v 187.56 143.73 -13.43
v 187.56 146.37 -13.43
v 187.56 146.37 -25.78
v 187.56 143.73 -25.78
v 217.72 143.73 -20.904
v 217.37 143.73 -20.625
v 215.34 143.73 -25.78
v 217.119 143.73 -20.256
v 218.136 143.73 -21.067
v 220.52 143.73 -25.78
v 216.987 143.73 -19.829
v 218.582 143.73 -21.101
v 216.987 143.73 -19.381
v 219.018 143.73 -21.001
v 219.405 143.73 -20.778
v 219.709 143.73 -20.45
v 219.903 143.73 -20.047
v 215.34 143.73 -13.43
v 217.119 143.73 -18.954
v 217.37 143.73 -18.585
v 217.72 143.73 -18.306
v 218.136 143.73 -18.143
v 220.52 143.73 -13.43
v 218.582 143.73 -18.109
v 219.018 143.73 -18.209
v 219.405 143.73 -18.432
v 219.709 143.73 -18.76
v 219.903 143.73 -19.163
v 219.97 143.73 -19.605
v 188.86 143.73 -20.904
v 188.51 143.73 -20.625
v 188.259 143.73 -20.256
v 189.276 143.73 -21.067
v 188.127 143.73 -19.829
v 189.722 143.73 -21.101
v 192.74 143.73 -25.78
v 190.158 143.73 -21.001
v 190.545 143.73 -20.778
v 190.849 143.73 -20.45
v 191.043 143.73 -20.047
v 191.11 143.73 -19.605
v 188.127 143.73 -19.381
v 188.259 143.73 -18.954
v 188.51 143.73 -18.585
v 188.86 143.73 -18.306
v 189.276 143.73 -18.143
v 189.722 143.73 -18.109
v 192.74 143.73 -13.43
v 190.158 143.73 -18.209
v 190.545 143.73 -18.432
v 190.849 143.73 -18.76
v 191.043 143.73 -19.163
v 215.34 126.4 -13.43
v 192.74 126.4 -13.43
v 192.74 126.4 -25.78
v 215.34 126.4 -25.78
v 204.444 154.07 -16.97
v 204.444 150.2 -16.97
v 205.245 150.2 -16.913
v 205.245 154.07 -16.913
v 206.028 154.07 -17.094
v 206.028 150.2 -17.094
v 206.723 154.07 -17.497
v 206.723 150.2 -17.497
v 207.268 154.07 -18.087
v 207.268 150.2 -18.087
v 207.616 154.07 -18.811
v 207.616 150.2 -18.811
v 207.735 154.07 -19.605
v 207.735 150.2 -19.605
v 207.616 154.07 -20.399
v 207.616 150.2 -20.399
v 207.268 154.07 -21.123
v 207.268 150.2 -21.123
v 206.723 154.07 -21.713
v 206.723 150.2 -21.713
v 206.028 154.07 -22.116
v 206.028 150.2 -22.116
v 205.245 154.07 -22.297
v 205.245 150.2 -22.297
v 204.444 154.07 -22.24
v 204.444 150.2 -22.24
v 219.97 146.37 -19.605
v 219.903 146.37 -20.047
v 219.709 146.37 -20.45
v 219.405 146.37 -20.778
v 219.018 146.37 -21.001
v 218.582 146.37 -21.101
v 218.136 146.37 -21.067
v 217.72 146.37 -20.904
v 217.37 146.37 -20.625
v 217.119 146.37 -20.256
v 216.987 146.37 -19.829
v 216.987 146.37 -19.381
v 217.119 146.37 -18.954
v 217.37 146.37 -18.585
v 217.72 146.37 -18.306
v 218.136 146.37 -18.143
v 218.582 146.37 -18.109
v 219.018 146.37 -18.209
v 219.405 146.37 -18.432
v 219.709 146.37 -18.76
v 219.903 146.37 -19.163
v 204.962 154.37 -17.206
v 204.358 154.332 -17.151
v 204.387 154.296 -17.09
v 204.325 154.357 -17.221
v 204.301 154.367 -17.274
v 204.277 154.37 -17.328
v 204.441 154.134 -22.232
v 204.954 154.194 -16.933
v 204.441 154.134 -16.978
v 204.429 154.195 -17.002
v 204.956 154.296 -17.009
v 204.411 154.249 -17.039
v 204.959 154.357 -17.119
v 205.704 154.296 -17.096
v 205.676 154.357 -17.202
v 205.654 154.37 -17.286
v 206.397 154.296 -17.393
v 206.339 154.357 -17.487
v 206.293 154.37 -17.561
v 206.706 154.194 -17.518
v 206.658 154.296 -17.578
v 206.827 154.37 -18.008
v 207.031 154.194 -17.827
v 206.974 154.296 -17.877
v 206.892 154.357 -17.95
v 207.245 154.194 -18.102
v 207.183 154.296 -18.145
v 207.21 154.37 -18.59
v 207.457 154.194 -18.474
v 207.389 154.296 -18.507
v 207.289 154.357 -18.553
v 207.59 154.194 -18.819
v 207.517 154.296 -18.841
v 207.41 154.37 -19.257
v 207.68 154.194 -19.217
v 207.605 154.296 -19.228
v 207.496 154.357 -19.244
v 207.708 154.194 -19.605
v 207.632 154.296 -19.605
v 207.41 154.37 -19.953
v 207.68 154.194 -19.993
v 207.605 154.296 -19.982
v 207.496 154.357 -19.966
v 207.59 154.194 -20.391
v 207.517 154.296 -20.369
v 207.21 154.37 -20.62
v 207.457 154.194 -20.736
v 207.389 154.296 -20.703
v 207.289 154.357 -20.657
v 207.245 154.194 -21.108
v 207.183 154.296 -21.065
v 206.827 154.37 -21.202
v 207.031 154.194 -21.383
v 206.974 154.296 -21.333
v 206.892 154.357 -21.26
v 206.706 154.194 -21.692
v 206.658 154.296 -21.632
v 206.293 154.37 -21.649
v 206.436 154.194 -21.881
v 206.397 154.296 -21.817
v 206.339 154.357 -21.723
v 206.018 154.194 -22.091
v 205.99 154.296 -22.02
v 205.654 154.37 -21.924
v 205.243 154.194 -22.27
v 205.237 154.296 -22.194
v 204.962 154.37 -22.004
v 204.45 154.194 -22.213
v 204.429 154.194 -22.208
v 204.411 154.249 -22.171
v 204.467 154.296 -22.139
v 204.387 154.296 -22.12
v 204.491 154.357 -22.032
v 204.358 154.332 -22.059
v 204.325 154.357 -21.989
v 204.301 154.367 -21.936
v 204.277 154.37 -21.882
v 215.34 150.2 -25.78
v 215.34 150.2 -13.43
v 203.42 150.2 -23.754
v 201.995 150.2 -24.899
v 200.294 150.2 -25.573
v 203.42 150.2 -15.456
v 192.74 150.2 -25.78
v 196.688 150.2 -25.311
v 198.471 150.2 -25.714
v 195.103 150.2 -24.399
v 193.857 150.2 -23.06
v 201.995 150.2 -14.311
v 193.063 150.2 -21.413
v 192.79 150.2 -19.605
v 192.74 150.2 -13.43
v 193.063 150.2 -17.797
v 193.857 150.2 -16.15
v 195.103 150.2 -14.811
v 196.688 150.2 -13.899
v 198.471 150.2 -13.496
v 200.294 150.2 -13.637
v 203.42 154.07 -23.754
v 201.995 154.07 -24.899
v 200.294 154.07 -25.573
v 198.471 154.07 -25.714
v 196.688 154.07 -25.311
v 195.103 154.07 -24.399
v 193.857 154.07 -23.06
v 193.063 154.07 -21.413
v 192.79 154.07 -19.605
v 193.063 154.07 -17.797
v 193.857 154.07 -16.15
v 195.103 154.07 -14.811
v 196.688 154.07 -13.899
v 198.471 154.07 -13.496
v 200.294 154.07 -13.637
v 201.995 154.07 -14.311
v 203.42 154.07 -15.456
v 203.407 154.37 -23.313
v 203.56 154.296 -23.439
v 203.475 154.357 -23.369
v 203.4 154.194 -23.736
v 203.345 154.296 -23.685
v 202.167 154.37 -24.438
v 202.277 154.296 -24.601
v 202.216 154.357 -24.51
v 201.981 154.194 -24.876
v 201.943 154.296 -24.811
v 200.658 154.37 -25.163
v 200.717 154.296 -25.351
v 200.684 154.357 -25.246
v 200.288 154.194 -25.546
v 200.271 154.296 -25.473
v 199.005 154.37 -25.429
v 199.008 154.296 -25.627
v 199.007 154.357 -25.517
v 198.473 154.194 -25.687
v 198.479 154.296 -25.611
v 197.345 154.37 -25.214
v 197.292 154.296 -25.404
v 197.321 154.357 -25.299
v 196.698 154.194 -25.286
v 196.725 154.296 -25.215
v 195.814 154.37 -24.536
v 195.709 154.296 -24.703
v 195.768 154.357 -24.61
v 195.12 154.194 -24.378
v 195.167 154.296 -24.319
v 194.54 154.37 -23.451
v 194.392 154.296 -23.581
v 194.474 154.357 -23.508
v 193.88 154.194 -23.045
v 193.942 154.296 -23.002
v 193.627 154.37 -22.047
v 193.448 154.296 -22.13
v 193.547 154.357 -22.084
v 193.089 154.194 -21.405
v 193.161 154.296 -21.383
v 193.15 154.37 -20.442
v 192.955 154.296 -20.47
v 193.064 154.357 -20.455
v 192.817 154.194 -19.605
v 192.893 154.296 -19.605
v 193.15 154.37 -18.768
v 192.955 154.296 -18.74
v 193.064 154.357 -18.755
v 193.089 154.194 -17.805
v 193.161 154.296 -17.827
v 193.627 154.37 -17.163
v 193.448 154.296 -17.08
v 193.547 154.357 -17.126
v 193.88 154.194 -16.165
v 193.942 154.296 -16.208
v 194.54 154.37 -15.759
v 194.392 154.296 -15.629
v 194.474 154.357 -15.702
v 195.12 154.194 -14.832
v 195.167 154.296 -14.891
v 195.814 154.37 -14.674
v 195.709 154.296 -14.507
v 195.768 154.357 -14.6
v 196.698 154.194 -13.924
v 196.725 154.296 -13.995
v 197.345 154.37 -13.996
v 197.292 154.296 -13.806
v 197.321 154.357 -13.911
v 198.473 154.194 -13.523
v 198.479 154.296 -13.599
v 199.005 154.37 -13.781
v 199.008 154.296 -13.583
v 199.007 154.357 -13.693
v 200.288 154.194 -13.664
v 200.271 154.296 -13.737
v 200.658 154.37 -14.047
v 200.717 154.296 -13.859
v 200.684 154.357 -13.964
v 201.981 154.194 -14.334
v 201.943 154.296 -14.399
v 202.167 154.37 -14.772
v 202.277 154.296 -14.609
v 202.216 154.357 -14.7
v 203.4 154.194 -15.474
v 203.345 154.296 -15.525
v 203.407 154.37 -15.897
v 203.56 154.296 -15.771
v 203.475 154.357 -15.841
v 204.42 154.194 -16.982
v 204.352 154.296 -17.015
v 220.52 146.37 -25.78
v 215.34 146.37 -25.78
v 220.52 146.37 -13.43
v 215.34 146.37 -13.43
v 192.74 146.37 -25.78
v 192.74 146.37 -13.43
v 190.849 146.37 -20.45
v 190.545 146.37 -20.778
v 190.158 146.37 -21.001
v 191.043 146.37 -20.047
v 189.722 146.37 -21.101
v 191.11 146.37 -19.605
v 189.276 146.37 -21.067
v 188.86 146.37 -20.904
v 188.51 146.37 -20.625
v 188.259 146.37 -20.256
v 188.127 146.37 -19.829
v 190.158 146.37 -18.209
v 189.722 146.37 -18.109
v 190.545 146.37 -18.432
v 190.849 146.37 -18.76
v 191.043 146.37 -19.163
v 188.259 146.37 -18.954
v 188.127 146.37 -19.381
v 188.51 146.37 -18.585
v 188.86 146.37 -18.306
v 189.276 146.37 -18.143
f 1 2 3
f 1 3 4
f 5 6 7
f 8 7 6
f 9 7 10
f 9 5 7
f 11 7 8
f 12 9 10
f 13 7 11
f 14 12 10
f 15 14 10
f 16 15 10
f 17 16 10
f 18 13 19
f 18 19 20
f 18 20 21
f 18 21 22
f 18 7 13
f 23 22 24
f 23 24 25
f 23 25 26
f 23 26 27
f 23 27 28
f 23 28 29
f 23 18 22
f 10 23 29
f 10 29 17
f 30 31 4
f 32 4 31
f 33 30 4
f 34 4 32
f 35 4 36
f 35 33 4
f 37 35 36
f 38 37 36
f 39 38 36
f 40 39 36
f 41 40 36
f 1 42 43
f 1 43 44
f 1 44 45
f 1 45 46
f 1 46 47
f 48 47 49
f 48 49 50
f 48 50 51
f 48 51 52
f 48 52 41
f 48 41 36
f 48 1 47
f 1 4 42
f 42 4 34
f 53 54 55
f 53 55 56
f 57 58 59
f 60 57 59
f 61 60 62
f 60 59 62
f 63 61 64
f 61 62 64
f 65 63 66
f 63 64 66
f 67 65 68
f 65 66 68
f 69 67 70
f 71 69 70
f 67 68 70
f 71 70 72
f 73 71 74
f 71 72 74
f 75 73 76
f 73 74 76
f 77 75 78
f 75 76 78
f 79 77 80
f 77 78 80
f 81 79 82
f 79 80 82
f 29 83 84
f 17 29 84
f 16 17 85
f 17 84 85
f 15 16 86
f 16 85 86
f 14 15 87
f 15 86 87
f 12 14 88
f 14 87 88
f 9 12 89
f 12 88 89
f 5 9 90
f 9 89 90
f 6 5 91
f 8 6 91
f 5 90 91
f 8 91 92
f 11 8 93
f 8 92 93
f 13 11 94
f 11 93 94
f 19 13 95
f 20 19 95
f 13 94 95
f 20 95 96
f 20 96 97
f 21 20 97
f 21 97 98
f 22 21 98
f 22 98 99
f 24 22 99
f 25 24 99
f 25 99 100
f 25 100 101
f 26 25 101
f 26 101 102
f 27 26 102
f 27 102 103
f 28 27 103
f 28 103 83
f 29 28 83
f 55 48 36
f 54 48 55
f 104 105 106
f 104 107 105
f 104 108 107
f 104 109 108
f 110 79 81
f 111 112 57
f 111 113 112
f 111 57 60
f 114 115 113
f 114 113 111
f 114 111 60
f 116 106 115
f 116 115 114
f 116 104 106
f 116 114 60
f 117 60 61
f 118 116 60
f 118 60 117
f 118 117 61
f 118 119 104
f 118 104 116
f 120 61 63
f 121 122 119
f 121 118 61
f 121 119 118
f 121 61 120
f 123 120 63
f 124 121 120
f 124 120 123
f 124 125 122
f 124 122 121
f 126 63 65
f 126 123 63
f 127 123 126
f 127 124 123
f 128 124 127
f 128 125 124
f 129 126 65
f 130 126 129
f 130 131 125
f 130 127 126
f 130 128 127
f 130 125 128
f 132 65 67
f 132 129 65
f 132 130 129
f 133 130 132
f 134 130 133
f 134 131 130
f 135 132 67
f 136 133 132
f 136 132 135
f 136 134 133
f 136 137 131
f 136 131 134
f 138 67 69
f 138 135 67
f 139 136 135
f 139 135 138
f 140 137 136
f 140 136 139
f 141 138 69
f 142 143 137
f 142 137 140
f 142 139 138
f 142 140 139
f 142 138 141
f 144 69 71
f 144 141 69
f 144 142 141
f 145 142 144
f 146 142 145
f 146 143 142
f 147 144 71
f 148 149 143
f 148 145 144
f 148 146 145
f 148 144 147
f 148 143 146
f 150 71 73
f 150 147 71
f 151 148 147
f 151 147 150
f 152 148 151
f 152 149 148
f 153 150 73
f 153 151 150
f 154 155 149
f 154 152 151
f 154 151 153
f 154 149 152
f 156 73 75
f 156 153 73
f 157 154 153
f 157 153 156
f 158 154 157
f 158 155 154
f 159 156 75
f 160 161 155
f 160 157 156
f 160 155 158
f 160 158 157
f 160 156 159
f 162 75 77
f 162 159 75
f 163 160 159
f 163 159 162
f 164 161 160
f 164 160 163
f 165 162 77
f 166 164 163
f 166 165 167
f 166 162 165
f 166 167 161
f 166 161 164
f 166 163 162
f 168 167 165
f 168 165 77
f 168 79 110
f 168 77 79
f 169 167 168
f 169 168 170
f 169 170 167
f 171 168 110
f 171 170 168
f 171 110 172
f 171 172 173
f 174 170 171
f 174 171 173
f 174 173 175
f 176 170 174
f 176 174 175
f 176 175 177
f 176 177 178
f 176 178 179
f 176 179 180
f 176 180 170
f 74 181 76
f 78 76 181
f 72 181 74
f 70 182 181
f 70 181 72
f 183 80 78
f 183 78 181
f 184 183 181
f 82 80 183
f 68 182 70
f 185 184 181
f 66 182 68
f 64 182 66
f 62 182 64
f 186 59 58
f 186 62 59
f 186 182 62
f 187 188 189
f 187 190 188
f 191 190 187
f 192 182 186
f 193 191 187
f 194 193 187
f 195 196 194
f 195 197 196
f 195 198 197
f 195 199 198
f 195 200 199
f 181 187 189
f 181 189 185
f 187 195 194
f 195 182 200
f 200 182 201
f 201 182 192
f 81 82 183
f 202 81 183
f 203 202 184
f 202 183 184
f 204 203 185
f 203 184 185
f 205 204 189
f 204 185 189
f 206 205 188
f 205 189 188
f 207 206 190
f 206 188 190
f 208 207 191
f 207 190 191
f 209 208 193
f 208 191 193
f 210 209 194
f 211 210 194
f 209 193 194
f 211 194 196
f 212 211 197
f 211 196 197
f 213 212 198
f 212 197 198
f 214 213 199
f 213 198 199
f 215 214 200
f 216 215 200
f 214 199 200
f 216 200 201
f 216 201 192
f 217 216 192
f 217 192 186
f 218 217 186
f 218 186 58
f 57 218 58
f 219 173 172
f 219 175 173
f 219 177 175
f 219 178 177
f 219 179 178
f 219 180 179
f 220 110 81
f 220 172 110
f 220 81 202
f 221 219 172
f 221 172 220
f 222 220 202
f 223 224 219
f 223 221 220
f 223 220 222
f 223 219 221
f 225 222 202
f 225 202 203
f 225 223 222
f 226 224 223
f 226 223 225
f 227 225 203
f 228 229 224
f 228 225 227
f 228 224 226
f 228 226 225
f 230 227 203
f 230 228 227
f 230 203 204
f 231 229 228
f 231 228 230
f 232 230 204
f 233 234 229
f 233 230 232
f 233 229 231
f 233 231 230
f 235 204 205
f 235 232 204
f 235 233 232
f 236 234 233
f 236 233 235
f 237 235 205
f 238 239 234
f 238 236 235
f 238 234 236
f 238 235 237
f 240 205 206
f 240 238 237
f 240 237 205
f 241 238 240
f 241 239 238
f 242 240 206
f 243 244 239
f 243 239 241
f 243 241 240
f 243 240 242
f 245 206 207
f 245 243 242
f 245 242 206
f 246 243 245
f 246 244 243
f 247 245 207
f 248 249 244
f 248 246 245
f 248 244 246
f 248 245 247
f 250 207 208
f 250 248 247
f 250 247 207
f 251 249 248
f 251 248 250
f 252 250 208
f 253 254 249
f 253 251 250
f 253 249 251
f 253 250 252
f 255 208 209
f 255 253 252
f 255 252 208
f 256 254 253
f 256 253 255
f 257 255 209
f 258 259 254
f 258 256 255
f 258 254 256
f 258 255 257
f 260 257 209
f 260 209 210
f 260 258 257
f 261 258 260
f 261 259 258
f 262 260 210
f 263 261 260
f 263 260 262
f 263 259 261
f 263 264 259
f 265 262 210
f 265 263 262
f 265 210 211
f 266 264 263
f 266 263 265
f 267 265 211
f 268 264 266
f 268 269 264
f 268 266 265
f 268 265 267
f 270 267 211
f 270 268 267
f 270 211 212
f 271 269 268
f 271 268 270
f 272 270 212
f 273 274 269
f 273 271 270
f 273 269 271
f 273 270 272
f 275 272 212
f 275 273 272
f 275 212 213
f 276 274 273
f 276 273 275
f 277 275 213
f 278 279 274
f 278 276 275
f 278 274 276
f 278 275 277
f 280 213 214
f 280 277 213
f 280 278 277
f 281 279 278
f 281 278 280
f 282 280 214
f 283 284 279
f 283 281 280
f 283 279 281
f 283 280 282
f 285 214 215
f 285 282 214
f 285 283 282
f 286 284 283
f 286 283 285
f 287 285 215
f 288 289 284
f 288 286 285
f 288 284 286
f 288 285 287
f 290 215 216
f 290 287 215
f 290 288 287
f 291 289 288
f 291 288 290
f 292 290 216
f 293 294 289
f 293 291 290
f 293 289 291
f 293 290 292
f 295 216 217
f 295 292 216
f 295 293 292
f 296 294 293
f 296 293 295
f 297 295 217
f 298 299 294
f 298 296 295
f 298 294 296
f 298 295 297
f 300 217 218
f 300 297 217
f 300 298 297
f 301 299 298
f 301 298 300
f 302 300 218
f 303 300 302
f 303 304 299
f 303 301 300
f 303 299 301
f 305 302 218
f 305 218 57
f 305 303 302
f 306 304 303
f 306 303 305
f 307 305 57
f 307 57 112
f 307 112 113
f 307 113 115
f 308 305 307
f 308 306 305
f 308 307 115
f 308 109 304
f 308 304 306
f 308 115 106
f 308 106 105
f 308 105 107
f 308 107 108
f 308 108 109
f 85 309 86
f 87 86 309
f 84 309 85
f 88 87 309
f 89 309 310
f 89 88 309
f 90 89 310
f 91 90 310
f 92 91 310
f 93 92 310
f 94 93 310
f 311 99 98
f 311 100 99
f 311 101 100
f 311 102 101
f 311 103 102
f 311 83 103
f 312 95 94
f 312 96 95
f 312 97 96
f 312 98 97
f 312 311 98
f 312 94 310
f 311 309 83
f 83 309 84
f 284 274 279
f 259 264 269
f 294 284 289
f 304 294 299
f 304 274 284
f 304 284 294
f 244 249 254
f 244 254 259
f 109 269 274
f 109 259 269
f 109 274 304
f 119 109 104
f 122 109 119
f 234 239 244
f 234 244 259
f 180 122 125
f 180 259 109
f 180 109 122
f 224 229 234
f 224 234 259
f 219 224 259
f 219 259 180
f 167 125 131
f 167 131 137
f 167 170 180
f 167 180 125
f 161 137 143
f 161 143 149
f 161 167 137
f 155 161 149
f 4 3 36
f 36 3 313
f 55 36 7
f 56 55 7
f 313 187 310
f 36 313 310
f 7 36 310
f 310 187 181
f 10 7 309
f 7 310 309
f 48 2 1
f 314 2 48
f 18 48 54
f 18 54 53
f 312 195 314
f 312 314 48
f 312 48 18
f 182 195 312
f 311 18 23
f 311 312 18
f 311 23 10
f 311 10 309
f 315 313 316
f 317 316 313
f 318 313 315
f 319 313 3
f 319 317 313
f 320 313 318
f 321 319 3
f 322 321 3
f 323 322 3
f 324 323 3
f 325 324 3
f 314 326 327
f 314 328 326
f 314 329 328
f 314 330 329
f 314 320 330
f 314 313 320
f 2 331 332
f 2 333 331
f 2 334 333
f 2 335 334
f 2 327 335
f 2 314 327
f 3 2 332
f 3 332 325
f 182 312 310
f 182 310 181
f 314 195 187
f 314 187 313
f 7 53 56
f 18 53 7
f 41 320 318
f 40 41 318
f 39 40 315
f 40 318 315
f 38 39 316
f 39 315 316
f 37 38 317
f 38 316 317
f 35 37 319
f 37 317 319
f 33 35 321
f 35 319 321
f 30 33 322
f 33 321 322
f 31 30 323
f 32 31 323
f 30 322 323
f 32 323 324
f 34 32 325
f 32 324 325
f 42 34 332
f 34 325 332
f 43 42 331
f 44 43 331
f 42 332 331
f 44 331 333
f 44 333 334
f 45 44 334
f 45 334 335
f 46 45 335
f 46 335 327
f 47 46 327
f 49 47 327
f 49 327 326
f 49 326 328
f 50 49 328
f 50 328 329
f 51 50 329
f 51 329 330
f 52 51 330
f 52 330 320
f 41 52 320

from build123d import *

# Parameters (mm, degrees)
PAD018_DEPTH            = 12.35
PAD019_DEPTH            = 4.17
SKETCH036_R             = 1.5
POCKET011_DEPTH         = 5
FILLET014_R             = 0.3
BODY008_PLACEMENT_ANGLE = 180


with BuildPart() as part:
    # Sketch034 → Pad018 (new body)
    with BuildSketch(Plane.XY):
        Polygon((0, 23.8), (22.6, 23.8), (22.6, 19.97), (27.78, 19.97), (27.78, 17.33), (22.6, 17.33), (22.6, 0), (0, 0), (0, 17.33), (-5.18, 17.33), (-5.18, 19.97), (0, 19.97), align=None)
    extrude(amount=PAD018_DEPTH)

    # Sketch035 (on Face4 of Pad018) → Pad019 (join)
    with BuildSketch(Plane(origin=(0, 23.8, 0), x_dir=(-1, 0, 0), z_dir=(0, 1, 0))):
        with BuildLine():
            ThreePointArc((-10.895586, 8.809617), (-22.55, 6.175), (-10.895586, 3.540383))
            ThreePointArc((-10.895586, 3.540383), (-7.605, 6.175), (-10.895586, 8.809617))
        make_face()
    extrude(amount=PAD019_DEPTH)

    # Sketch036 (on Face10 of Pad019) → Pocket011 (cut)
    with BuildSketch(Plane(origin=(0, 19.97, 0), x_dir=(-1, 0, 0), z_dir=(0, 1, 0))):
        with Locations((-25.73, 6.175)):
            Circle(SKETCH036_R)
        with Locations((3.13, 6.175)):
            Circle(SKETCH036_R)
    extrude(amount=-POCKET011_DEPTH, mode=Mode.SUBTRACT)

    # Fillet014
    fillet014_edges = [part.edges().sort_by_distance(p)[0] for p in [
        (22.55, 27.97, 6.175),
        (7.605, 27.97, 6.175),
    ]]
    fillet(fillet014_edges, radius=FILLET014_R)


with BuildPart() as part_1:
    # Body008 placement: moved
    add(part.part.moved(Location((215.339996, 126.400008, -13.43))).rotate(Axis((215.339996, 126.400008, -13.43), (0, 1, 0)), BODY008_PLACEMENT_ANGLE))


solid = part_1.part
